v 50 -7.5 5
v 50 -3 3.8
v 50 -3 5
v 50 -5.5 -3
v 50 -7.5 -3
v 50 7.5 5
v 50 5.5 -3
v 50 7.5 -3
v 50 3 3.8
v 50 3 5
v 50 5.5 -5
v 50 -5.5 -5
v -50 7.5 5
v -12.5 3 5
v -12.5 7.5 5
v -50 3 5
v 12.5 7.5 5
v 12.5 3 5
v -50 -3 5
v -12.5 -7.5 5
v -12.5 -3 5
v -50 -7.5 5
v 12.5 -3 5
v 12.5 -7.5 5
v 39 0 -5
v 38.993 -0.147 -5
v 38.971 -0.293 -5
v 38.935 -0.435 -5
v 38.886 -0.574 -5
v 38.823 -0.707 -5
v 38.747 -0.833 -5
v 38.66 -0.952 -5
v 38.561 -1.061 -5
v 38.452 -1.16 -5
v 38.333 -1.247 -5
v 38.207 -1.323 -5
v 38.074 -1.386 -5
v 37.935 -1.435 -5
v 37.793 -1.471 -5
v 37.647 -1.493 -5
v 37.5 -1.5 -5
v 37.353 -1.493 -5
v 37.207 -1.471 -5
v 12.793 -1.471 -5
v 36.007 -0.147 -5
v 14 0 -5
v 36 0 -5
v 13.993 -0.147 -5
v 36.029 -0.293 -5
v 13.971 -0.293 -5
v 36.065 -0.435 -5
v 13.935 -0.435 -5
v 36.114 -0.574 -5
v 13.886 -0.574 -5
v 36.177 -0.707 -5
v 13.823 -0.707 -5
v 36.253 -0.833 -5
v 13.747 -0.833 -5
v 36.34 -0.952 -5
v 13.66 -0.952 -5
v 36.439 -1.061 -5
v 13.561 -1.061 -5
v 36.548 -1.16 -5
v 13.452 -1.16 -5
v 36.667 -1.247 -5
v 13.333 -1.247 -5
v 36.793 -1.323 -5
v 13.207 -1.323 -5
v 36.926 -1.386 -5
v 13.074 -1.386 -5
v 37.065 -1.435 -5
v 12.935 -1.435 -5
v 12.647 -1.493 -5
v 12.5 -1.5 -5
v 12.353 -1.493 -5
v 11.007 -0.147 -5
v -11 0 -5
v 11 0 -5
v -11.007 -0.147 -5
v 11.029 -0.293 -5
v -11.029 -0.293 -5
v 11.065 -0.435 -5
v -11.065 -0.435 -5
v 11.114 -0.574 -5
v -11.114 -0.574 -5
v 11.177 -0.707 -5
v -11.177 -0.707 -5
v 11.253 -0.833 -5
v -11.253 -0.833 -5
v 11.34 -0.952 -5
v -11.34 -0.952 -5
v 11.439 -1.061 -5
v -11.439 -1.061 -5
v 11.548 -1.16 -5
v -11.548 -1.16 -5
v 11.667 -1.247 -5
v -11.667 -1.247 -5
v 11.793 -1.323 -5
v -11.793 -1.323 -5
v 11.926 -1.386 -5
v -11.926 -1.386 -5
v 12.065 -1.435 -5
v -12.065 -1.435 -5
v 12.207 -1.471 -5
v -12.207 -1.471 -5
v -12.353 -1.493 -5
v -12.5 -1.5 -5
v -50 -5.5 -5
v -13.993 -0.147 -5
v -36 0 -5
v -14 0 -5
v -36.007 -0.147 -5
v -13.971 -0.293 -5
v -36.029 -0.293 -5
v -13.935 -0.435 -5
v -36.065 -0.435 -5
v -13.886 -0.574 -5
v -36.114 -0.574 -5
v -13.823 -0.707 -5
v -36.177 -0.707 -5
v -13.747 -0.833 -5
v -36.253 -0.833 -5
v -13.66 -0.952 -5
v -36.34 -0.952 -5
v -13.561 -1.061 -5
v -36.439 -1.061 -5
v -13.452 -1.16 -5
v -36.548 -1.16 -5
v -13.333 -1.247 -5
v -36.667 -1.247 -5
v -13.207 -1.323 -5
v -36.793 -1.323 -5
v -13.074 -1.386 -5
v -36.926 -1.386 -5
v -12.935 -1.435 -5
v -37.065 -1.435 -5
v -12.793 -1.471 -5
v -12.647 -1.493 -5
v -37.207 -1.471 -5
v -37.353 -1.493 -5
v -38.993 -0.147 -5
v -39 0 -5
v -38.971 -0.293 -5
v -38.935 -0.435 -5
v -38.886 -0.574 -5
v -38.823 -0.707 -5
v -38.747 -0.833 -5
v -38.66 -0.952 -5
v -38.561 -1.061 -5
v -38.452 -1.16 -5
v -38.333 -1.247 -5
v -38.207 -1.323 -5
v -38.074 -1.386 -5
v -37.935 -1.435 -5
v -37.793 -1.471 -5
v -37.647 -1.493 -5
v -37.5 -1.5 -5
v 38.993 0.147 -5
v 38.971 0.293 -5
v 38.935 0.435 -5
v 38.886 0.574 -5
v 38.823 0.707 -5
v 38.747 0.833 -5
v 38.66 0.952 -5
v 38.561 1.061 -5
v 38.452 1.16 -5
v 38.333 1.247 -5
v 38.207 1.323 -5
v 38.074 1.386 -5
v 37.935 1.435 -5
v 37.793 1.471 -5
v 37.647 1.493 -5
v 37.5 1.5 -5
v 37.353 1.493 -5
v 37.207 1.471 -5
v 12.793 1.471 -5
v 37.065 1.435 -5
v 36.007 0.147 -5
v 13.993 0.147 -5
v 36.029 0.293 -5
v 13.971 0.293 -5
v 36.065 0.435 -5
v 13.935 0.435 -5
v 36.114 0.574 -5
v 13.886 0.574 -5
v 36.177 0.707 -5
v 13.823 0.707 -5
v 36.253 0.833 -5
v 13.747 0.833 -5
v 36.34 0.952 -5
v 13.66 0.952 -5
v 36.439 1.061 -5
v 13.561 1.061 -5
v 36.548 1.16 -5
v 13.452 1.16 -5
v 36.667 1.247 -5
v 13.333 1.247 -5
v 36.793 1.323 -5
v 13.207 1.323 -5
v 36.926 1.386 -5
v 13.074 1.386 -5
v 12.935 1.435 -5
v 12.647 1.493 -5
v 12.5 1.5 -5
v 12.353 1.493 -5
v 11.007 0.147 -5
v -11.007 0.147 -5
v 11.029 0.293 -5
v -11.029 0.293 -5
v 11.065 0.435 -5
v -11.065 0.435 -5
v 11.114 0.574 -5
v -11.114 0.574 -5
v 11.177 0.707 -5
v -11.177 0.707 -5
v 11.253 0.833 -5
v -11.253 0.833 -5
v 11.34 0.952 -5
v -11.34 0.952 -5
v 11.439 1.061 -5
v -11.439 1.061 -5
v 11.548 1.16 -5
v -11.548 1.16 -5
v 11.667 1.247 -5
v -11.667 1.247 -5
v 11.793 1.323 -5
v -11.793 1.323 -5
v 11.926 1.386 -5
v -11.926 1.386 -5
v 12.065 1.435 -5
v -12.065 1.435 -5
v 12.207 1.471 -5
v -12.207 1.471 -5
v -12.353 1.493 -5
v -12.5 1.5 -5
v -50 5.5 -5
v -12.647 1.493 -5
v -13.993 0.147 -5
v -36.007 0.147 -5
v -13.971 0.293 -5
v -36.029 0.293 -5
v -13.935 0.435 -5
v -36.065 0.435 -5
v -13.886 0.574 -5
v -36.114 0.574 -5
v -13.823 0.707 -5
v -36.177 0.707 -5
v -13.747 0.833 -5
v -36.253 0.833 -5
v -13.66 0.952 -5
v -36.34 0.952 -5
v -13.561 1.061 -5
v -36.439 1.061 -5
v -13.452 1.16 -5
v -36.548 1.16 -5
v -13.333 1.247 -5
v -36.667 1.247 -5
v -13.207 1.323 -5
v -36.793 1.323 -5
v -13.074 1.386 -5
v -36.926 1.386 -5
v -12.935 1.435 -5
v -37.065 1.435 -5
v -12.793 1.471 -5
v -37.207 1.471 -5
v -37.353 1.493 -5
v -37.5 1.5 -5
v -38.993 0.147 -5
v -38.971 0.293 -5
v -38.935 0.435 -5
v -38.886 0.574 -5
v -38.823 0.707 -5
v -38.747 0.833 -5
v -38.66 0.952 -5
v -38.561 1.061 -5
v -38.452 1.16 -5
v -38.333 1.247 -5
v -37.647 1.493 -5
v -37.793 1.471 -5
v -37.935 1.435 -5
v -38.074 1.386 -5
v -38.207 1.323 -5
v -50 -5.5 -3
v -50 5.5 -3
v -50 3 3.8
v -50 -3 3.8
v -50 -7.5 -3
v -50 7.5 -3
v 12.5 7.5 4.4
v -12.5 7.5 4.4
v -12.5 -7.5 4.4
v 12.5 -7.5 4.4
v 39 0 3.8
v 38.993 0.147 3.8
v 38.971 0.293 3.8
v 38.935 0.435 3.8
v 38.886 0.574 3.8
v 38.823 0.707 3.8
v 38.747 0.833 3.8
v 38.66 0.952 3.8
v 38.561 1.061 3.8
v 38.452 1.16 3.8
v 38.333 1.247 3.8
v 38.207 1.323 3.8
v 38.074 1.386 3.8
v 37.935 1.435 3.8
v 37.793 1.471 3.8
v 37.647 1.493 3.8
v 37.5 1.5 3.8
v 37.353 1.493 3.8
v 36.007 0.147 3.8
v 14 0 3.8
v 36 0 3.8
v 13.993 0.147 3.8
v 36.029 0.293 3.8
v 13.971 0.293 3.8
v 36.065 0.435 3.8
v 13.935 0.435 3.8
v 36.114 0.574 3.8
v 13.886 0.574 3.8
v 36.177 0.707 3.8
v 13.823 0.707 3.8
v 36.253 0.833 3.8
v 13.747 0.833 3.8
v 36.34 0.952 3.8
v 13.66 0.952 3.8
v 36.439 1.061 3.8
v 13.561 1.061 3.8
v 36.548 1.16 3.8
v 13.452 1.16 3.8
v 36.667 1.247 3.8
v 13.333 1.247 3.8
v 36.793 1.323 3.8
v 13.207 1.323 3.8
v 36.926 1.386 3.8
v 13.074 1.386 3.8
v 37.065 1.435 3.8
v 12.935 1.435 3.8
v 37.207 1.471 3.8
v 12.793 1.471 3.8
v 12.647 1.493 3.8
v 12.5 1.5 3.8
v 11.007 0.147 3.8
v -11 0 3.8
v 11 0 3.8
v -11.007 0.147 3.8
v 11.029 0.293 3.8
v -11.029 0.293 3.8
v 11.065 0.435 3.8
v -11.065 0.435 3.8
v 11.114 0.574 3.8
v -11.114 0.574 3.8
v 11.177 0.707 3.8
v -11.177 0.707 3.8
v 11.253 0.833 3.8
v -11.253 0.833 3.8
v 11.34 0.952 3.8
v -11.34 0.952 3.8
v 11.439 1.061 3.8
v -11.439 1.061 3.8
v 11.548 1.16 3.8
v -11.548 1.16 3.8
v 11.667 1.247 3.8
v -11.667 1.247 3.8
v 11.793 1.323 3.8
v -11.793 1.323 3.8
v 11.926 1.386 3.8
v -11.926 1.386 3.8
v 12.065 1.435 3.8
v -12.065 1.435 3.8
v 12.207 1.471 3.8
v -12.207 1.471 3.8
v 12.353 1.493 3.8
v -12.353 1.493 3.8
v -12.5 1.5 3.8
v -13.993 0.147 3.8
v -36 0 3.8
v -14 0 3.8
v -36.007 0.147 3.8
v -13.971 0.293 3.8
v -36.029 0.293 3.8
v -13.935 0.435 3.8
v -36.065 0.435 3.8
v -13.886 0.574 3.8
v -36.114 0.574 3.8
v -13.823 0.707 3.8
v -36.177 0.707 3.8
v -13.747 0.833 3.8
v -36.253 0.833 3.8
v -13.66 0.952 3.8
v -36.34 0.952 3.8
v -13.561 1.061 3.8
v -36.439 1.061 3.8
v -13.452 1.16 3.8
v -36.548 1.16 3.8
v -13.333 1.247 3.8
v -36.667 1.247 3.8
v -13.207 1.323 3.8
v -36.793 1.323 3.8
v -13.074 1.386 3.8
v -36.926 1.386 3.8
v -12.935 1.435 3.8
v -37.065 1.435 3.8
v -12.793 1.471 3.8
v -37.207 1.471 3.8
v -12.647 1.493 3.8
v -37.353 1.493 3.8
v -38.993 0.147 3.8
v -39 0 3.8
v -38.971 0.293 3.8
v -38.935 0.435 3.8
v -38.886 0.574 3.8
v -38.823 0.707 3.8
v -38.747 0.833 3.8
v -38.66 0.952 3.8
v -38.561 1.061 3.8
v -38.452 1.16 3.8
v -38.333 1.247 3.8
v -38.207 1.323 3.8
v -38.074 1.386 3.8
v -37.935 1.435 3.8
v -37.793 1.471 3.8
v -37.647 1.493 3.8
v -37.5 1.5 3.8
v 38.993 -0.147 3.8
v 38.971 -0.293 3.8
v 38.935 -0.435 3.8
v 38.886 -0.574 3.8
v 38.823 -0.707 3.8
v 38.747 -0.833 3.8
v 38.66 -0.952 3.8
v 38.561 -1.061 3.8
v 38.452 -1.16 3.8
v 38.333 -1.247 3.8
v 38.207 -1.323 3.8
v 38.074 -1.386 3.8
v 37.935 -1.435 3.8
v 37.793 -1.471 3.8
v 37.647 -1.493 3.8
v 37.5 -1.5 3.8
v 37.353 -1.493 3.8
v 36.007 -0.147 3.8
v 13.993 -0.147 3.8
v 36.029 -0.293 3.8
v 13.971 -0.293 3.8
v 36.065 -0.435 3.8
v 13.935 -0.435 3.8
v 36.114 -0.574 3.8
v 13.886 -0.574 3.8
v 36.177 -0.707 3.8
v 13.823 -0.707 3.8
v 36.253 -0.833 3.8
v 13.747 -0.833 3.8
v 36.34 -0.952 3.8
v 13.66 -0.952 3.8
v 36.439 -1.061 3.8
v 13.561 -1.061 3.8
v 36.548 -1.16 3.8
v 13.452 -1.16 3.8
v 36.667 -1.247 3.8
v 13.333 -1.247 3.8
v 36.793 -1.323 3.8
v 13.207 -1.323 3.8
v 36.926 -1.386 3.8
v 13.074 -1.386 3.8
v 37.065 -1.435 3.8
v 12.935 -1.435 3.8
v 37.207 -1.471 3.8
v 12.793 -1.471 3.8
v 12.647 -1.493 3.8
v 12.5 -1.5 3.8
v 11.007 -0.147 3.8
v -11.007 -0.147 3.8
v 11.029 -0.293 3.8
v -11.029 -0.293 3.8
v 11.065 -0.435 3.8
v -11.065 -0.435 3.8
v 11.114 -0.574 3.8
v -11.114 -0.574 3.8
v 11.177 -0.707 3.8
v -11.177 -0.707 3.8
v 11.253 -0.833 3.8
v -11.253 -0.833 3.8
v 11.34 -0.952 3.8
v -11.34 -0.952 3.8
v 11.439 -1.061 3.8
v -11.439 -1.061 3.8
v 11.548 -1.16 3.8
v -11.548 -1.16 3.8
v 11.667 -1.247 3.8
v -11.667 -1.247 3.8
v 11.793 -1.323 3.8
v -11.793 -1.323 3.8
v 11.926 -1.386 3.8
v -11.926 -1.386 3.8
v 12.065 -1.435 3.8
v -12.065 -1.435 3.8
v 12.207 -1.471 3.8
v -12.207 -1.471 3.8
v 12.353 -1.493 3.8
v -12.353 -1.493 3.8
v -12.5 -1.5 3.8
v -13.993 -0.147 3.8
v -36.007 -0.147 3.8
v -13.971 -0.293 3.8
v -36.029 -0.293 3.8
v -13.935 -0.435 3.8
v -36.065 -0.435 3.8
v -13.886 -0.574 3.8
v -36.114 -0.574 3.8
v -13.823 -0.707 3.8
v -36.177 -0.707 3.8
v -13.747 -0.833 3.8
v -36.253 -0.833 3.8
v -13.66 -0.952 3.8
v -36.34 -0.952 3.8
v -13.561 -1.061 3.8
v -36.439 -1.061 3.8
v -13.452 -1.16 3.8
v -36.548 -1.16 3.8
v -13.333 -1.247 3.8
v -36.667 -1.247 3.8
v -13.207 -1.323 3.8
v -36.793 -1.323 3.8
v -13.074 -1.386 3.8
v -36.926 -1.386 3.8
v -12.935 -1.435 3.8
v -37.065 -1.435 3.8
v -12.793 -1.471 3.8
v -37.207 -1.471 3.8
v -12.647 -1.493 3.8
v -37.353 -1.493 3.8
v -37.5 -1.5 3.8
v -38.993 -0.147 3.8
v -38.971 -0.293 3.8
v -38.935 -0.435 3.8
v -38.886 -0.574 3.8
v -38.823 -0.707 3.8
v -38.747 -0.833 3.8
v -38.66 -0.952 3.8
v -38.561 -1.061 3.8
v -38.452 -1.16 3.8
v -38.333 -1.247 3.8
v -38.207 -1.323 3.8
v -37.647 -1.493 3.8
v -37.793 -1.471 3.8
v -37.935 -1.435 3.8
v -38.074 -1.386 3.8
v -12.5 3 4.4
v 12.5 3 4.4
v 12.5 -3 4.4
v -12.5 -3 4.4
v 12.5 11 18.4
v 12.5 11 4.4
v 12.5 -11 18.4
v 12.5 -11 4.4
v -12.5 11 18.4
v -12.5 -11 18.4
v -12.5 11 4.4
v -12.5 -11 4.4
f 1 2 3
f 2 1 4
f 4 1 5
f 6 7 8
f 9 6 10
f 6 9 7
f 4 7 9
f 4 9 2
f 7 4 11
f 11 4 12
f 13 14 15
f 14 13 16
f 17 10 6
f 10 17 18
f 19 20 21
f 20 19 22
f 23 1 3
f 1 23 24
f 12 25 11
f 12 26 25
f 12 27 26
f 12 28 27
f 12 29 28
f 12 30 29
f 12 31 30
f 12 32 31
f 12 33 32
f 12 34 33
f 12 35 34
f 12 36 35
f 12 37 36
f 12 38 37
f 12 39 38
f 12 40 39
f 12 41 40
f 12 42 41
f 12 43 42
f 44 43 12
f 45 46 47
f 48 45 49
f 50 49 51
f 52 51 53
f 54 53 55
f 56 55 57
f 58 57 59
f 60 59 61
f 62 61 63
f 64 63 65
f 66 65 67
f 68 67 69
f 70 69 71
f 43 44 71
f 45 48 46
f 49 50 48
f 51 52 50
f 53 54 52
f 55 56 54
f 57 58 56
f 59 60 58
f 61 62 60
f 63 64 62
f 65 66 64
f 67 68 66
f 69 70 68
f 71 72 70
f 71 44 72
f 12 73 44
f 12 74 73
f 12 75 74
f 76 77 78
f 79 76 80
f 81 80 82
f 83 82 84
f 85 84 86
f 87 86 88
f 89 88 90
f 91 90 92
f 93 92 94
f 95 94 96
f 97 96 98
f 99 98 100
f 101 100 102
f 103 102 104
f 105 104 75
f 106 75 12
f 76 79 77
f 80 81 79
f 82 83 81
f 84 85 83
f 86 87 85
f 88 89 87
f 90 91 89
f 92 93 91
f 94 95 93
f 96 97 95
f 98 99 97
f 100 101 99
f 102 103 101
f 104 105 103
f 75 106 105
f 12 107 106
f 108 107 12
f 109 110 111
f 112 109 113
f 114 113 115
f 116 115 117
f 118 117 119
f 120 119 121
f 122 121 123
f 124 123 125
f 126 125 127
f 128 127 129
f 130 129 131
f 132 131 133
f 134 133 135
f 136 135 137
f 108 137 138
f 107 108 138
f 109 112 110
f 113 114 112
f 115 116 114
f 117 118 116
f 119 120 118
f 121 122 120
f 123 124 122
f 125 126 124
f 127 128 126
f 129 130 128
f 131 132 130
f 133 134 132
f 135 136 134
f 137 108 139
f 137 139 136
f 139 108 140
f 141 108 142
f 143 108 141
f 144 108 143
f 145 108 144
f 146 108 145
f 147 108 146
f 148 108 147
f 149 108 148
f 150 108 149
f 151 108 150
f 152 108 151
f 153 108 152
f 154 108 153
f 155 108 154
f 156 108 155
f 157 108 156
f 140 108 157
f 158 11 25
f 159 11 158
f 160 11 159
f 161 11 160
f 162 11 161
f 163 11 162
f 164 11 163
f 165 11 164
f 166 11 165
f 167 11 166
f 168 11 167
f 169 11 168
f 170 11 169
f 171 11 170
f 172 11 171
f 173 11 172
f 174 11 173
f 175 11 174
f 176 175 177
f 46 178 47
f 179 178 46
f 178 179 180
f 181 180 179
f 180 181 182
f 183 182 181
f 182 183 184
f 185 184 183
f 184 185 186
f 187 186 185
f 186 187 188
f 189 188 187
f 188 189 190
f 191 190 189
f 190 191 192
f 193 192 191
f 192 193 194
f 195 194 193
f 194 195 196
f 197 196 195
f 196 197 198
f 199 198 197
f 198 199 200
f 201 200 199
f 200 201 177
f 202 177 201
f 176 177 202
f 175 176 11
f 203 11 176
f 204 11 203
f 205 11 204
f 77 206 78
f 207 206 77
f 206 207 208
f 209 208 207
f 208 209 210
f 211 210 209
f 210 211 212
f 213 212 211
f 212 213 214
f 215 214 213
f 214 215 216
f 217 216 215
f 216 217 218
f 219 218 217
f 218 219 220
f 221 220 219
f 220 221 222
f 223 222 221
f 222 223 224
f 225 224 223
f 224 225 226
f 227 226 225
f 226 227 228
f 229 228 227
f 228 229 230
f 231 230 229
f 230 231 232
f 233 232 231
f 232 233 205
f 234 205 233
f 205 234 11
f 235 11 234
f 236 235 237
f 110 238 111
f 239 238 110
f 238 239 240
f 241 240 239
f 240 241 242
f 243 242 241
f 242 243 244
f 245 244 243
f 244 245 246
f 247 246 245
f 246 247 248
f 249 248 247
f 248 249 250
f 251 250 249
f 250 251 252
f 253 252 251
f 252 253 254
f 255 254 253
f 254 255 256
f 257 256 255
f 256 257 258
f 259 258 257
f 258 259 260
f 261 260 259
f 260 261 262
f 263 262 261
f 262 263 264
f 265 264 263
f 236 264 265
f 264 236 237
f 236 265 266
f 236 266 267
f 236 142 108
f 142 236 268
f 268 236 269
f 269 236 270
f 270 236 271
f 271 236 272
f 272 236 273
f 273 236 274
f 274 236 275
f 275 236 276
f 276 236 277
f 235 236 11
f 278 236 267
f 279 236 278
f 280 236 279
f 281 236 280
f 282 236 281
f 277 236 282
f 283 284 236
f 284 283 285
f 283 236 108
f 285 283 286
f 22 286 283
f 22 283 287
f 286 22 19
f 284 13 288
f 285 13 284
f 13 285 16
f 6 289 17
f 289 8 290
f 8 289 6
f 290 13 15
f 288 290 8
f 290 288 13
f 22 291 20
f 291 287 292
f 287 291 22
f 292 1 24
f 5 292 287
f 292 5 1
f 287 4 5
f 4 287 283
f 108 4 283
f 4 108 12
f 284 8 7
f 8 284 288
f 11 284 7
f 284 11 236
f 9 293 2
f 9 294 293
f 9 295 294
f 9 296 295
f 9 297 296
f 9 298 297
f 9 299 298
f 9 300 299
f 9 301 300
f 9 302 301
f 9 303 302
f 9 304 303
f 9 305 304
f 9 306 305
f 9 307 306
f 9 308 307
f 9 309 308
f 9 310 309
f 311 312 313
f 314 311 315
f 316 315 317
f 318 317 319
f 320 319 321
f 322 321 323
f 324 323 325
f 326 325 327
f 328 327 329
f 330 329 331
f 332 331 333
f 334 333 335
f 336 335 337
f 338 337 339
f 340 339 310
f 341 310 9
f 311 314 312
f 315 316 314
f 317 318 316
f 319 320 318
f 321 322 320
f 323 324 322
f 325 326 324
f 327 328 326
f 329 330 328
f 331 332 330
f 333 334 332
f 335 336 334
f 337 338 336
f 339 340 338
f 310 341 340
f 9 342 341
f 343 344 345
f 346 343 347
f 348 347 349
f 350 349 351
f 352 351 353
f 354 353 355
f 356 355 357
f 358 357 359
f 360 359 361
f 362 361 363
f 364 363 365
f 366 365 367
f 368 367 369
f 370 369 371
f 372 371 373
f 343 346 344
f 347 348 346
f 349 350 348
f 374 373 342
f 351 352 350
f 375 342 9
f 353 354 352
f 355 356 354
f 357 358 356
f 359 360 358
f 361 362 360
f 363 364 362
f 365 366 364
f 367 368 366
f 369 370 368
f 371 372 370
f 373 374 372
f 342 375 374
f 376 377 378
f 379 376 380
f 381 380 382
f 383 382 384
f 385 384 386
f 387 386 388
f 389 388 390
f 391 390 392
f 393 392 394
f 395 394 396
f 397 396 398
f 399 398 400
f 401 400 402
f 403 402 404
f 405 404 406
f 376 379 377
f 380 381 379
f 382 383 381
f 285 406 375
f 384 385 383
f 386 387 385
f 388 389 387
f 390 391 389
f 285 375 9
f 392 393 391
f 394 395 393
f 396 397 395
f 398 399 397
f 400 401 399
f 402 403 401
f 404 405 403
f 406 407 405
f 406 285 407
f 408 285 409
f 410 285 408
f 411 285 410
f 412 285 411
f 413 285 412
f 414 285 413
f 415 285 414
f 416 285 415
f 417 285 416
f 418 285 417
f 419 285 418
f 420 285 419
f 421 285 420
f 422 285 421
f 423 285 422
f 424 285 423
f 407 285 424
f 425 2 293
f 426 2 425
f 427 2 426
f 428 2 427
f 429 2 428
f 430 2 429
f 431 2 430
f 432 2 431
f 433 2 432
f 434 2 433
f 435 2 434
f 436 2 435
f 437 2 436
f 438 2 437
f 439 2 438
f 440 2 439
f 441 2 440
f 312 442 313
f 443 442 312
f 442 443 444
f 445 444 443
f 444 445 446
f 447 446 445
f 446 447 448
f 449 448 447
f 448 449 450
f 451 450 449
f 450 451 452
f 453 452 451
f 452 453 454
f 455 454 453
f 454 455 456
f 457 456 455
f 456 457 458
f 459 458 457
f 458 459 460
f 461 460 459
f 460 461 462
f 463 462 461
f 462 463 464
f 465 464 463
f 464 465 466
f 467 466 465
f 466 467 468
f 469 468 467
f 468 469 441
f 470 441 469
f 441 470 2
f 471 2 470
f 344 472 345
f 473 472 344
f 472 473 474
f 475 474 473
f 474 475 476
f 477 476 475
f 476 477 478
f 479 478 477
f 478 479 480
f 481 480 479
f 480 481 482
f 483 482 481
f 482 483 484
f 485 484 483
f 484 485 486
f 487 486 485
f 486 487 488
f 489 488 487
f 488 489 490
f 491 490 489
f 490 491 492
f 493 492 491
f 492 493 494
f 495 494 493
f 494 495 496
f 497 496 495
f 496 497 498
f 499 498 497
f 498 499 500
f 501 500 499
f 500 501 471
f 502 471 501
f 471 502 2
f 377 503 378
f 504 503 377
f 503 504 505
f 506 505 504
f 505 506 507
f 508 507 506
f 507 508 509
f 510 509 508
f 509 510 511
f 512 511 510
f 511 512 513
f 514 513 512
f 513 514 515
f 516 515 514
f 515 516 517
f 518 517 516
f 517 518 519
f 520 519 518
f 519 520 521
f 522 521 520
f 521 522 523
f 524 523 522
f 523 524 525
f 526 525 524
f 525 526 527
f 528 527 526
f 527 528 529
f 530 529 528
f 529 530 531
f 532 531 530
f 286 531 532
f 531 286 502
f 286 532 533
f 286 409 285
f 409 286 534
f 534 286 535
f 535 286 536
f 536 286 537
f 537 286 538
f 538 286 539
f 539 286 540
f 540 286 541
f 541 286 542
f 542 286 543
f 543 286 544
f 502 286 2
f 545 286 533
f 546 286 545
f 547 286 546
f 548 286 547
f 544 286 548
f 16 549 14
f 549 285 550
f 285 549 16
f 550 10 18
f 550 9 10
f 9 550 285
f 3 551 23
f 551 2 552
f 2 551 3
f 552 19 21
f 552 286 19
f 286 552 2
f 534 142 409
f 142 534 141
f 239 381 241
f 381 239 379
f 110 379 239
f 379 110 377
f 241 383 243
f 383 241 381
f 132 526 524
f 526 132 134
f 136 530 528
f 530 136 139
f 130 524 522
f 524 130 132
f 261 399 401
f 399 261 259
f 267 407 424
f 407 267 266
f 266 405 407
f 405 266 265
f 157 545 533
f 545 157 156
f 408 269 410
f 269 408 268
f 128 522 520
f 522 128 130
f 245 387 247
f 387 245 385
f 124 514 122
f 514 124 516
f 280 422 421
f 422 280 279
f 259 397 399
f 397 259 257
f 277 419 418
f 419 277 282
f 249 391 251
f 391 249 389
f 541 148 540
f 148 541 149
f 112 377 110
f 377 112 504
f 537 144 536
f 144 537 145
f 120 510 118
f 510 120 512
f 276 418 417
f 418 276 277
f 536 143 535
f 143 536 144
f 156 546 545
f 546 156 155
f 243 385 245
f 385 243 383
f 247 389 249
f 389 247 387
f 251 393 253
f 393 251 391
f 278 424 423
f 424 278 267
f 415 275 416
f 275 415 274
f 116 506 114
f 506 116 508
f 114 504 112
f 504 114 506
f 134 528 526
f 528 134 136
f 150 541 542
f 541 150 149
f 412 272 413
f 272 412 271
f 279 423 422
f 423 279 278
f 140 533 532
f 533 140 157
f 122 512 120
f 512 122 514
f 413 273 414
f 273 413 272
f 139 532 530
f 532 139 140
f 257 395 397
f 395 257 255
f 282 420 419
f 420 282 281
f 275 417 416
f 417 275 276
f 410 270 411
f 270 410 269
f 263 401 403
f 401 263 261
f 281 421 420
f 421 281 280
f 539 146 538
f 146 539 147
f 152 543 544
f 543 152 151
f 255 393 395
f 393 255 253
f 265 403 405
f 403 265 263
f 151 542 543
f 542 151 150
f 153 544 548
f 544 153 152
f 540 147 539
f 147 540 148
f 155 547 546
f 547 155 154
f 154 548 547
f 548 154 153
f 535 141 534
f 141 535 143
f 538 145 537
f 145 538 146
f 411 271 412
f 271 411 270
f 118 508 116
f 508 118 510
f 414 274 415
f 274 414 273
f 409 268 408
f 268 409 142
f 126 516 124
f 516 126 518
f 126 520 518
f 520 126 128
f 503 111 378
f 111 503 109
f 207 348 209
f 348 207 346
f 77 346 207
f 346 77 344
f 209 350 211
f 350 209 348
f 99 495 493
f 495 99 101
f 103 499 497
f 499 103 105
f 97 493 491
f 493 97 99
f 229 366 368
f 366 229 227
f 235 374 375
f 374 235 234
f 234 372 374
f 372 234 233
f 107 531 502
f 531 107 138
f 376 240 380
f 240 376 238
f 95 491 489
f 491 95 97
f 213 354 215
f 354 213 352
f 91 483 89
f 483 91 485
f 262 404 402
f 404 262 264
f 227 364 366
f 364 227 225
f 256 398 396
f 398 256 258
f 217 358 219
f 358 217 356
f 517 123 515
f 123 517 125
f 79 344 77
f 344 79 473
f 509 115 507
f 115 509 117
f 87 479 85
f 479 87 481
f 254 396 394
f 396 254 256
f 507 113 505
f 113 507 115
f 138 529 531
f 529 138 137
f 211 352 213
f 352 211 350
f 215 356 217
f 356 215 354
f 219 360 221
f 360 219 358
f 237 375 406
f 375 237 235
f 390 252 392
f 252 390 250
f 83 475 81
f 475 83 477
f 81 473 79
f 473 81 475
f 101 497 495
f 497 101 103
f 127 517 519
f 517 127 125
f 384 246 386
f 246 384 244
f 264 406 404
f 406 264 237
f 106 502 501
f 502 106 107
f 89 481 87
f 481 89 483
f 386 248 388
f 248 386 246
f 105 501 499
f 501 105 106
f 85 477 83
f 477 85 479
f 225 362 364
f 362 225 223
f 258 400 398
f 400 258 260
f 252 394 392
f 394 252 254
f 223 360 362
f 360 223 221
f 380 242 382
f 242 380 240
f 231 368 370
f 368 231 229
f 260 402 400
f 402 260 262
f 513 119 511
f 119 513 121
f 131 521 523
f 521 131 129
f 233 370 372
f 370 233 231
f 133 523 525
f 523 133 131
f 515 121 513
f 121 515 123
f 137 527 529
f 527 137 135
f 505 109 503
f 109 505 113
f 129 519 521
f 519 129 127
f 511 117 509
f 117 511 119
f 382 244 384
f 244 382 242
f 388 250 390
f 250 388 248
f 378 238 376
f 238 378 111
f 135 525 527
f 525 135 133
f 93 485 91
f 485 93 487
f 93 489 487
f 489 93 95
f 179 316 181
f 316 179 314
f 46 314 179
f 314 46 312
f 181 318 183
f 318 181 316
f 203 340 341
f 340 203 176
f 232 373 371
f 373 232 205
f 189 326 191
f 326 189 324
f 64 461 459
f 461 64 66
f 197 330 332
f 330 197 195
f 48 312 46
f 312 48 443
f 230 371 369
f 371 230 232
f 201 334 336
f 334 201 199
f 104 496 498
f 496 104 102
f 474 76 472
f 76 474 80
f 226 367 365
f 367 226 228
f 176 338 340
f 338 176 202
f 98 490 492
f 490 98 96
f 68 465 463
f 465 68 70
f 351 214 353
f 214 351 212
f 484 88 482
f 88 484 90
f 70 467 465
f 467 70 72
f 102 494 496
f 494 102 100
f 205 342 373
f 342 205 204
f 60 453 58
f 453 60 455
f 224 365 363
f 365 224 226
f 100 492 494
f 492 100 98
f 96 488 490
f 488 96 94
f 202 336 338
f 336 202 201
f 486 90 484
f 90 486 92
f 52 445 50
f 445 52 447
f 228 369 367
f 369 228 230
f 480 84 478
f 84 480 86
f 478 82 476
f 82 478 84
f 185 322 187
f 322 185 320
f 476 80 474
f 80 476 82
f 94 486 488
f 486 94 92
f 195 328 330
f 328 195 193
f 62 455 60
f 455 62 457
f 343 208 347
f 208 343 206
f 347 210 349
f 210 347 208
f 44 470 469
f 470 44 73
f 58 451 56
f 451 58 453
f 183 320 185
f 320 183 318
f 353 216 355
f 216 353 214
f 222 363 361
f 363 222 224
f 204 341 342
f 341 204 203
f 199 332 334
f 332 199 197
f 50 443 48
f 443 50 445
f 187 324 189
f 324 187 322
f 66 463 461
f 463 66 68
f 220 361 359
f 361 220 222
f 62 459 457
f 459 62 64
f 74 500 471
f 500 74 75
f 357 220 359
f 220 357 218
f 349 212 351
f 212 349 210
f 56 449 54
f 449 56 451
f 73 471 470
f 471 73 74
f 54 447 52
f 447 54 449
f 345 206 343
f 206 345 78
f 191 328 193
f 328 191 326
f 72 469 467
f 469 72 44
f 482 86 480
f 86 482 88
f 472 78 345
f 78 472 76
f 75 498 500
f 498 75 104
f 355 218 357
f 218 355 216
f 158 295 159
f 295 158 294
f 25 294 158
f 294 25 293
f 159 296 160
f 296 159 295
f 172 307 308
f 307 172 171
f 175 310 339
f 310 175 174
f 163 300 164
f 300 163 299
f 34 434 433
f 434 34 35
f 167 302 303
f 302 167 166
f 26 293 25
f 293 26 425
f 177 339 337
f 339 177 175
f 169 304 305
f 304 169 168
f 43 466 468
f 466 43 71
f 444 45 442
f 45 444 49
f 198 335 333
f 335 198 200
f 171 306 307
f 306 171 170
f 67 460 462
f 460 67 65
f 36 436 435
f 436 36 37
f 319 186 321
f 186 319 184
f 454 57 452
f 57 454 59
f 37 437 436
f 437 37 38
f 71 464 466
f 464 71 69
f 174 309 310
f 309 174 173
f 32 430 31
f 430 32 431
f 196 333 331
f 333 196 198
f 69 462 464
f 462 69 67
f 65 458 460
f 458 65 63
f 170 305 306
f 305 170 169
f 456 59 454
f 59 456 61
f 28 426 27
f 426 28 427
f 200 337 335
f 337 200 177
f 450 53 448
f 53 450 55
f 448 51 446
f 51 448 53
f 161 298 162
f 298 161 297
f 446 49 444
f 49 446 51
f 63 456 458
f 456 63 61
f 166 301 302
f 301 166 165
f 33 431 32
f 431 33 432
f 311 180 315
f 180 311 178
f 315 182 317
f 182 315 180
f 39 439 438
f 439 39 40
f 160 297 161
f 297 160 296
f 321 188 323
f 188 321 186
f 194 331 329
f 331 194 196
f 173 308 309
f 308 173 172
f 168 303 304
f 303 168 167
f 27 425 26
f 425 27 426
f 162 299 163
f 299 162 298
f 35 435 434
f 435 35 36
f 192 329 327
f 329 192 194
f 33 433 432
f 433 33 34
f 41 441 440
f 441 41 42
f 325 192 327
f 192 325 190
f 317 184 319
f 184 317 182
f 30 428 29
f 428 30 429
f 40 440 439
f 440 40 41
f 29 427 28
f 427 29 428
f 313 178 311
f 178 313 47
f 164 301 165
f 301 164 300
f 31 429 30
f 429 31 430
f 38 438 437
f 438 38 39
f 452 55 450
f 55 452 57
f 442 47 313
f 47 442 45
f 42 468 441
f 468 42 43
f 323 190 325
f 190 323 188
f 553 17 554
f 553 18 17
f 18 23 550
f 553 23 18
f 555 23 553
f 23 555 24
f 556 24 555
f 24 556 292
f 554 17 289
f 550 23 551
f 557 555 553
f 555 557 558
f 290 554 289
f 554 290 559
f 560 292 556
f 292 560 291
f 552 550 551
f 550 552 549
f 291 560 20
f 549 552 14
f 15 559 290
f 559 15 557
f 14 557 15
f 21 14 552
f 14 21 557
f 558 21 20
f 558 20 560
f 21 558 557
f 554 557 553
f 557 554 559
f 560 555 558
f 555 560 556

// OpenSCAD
$fn = 64;

// Miniature linear guide rail (connected rail + carriage)
// Target overall rail size: 100(L) x 15(W) x 10(H) mm

// ---------------- Parameters ----------------
rail_L = 100.0; //[50.0:200.0:1]
rail_W = 15.0;  //[7.5:30.0:0.5]
rail_H = 10.0;  //[5.0:20.0:0.5]

// Rail profile details (kept within rail_W/rail_H)
side_step_w = 2.0;   //[0.5:4.0:0.1]   // side relief width
side_step_h = 2.0;   //[0.5:4.0:0.1]   // side relief height from bottom
top_groove_w = 6.0;  //[2.0:10.0:0.5]  // top center groove width
top_groove_d = 1.2;  //[0.5:3.0:0.1]   // top center groove depth

// Mounting holes (through rail height)
hole_d = 3.0;        //[1.5:6.0:0.1]
hole_pitch = 25.0;   //[12.0:50.0:1]
hole_end_offset = 12.5; //[6.0:25.0:0.5]
hole_count = 4;      //[2:8:1]
hole_extra_depth = 2.0; //[0.5:5.0:0.5]

// Carriage block
carriage_L = 25.0;   //[12.0:60.0:1]
carriage_W = 22.0;   //[12.0:44.0:1]
carriage_H = 14.0;   //[7.0:28.0:1]

// Connection overlap to guarantee one connected solid
overlap = 0.6;       //[0.2:2.0:0.1]

// ---------------- Helpers ----------------
function clamp(v, lo, hi) = v < lo ? lo : (v > hi ? hi : v);

// Keep details valid for any parameter edits
side_step_w2 = clamp(side_step_w, 0, rail_W/2 - 0.2);
side_step_h2 = clamp(side_step_h, 0, rail_H - 0.2);
top_groove_w2 = clamp(top_groove_w, 0.5, rail_W - 0.5);
top_groove_d2 = clamp(top_groove_d, 0, rail_H/2 - 0.2);

// ---------------- Geometry ----------------
module rail_profile_solid() {
    // Base rail block with simple profile reliefs and a top groove
    difference() {
        cube([rail_L, rail_W, rail_H], center=true);

        // Side reliefs (bottom corners) to suggest rail profile
        // Left relief
        translate([0,
                   -rail_W/2 + side_step_w2/2,
                   -rail_H/2 + side_step_h2/2])
            cube([rail_L + 2*overlap, side_step_w2, side_step_h2], center=true);

        // Right relief
        translate([0,
                   rail_W/2 - side_step_w2/2,
                   -rail_H/2 + side_step_h2/2])
            cube([rail_L + 2*overlap, side_step_w2, side_step_h2], center=true);

        // Top center groove
        translate([0, 0, rail_H/2 - top_groove_d2/2])
            cube([rail_L + 2*overlap, top_groove_w2, top_groove_d2], center=true);
    }
}

module mounting_holes() {
    // Holes go through Z (height), positioned along X
    for (i = [0:hole_count-1]) {
        x = -rail_L/2 + hole_end_offset + i*hole_pitch;
        // Keep holes within rail length
        if (x <= rail_L/2 - hole_end_offset + 1e-6)
            translate([x, 0, 0])
                cylinder(h=rail_H + hole_extra_depth, r=hole_d/2, center=true);
    }
}

module carriage_block() {
    // Carriage sits on top of rail and overlaps slightly into it for connectivity
    translate([0, 0, rail_H/2 + carriage_H/2 - overlap])
        cube([carriage_L, carriage_W, carriage_H], center=true);
}

module complete_model() {
    union() {
        // Rail with holes
        difference() {
            rail_profile_solid();
            mounting_holes();
        }

        // Carriage (connected)
        carriage_block();
    }
}

// ---------------- Output ----------------
complete_model();
